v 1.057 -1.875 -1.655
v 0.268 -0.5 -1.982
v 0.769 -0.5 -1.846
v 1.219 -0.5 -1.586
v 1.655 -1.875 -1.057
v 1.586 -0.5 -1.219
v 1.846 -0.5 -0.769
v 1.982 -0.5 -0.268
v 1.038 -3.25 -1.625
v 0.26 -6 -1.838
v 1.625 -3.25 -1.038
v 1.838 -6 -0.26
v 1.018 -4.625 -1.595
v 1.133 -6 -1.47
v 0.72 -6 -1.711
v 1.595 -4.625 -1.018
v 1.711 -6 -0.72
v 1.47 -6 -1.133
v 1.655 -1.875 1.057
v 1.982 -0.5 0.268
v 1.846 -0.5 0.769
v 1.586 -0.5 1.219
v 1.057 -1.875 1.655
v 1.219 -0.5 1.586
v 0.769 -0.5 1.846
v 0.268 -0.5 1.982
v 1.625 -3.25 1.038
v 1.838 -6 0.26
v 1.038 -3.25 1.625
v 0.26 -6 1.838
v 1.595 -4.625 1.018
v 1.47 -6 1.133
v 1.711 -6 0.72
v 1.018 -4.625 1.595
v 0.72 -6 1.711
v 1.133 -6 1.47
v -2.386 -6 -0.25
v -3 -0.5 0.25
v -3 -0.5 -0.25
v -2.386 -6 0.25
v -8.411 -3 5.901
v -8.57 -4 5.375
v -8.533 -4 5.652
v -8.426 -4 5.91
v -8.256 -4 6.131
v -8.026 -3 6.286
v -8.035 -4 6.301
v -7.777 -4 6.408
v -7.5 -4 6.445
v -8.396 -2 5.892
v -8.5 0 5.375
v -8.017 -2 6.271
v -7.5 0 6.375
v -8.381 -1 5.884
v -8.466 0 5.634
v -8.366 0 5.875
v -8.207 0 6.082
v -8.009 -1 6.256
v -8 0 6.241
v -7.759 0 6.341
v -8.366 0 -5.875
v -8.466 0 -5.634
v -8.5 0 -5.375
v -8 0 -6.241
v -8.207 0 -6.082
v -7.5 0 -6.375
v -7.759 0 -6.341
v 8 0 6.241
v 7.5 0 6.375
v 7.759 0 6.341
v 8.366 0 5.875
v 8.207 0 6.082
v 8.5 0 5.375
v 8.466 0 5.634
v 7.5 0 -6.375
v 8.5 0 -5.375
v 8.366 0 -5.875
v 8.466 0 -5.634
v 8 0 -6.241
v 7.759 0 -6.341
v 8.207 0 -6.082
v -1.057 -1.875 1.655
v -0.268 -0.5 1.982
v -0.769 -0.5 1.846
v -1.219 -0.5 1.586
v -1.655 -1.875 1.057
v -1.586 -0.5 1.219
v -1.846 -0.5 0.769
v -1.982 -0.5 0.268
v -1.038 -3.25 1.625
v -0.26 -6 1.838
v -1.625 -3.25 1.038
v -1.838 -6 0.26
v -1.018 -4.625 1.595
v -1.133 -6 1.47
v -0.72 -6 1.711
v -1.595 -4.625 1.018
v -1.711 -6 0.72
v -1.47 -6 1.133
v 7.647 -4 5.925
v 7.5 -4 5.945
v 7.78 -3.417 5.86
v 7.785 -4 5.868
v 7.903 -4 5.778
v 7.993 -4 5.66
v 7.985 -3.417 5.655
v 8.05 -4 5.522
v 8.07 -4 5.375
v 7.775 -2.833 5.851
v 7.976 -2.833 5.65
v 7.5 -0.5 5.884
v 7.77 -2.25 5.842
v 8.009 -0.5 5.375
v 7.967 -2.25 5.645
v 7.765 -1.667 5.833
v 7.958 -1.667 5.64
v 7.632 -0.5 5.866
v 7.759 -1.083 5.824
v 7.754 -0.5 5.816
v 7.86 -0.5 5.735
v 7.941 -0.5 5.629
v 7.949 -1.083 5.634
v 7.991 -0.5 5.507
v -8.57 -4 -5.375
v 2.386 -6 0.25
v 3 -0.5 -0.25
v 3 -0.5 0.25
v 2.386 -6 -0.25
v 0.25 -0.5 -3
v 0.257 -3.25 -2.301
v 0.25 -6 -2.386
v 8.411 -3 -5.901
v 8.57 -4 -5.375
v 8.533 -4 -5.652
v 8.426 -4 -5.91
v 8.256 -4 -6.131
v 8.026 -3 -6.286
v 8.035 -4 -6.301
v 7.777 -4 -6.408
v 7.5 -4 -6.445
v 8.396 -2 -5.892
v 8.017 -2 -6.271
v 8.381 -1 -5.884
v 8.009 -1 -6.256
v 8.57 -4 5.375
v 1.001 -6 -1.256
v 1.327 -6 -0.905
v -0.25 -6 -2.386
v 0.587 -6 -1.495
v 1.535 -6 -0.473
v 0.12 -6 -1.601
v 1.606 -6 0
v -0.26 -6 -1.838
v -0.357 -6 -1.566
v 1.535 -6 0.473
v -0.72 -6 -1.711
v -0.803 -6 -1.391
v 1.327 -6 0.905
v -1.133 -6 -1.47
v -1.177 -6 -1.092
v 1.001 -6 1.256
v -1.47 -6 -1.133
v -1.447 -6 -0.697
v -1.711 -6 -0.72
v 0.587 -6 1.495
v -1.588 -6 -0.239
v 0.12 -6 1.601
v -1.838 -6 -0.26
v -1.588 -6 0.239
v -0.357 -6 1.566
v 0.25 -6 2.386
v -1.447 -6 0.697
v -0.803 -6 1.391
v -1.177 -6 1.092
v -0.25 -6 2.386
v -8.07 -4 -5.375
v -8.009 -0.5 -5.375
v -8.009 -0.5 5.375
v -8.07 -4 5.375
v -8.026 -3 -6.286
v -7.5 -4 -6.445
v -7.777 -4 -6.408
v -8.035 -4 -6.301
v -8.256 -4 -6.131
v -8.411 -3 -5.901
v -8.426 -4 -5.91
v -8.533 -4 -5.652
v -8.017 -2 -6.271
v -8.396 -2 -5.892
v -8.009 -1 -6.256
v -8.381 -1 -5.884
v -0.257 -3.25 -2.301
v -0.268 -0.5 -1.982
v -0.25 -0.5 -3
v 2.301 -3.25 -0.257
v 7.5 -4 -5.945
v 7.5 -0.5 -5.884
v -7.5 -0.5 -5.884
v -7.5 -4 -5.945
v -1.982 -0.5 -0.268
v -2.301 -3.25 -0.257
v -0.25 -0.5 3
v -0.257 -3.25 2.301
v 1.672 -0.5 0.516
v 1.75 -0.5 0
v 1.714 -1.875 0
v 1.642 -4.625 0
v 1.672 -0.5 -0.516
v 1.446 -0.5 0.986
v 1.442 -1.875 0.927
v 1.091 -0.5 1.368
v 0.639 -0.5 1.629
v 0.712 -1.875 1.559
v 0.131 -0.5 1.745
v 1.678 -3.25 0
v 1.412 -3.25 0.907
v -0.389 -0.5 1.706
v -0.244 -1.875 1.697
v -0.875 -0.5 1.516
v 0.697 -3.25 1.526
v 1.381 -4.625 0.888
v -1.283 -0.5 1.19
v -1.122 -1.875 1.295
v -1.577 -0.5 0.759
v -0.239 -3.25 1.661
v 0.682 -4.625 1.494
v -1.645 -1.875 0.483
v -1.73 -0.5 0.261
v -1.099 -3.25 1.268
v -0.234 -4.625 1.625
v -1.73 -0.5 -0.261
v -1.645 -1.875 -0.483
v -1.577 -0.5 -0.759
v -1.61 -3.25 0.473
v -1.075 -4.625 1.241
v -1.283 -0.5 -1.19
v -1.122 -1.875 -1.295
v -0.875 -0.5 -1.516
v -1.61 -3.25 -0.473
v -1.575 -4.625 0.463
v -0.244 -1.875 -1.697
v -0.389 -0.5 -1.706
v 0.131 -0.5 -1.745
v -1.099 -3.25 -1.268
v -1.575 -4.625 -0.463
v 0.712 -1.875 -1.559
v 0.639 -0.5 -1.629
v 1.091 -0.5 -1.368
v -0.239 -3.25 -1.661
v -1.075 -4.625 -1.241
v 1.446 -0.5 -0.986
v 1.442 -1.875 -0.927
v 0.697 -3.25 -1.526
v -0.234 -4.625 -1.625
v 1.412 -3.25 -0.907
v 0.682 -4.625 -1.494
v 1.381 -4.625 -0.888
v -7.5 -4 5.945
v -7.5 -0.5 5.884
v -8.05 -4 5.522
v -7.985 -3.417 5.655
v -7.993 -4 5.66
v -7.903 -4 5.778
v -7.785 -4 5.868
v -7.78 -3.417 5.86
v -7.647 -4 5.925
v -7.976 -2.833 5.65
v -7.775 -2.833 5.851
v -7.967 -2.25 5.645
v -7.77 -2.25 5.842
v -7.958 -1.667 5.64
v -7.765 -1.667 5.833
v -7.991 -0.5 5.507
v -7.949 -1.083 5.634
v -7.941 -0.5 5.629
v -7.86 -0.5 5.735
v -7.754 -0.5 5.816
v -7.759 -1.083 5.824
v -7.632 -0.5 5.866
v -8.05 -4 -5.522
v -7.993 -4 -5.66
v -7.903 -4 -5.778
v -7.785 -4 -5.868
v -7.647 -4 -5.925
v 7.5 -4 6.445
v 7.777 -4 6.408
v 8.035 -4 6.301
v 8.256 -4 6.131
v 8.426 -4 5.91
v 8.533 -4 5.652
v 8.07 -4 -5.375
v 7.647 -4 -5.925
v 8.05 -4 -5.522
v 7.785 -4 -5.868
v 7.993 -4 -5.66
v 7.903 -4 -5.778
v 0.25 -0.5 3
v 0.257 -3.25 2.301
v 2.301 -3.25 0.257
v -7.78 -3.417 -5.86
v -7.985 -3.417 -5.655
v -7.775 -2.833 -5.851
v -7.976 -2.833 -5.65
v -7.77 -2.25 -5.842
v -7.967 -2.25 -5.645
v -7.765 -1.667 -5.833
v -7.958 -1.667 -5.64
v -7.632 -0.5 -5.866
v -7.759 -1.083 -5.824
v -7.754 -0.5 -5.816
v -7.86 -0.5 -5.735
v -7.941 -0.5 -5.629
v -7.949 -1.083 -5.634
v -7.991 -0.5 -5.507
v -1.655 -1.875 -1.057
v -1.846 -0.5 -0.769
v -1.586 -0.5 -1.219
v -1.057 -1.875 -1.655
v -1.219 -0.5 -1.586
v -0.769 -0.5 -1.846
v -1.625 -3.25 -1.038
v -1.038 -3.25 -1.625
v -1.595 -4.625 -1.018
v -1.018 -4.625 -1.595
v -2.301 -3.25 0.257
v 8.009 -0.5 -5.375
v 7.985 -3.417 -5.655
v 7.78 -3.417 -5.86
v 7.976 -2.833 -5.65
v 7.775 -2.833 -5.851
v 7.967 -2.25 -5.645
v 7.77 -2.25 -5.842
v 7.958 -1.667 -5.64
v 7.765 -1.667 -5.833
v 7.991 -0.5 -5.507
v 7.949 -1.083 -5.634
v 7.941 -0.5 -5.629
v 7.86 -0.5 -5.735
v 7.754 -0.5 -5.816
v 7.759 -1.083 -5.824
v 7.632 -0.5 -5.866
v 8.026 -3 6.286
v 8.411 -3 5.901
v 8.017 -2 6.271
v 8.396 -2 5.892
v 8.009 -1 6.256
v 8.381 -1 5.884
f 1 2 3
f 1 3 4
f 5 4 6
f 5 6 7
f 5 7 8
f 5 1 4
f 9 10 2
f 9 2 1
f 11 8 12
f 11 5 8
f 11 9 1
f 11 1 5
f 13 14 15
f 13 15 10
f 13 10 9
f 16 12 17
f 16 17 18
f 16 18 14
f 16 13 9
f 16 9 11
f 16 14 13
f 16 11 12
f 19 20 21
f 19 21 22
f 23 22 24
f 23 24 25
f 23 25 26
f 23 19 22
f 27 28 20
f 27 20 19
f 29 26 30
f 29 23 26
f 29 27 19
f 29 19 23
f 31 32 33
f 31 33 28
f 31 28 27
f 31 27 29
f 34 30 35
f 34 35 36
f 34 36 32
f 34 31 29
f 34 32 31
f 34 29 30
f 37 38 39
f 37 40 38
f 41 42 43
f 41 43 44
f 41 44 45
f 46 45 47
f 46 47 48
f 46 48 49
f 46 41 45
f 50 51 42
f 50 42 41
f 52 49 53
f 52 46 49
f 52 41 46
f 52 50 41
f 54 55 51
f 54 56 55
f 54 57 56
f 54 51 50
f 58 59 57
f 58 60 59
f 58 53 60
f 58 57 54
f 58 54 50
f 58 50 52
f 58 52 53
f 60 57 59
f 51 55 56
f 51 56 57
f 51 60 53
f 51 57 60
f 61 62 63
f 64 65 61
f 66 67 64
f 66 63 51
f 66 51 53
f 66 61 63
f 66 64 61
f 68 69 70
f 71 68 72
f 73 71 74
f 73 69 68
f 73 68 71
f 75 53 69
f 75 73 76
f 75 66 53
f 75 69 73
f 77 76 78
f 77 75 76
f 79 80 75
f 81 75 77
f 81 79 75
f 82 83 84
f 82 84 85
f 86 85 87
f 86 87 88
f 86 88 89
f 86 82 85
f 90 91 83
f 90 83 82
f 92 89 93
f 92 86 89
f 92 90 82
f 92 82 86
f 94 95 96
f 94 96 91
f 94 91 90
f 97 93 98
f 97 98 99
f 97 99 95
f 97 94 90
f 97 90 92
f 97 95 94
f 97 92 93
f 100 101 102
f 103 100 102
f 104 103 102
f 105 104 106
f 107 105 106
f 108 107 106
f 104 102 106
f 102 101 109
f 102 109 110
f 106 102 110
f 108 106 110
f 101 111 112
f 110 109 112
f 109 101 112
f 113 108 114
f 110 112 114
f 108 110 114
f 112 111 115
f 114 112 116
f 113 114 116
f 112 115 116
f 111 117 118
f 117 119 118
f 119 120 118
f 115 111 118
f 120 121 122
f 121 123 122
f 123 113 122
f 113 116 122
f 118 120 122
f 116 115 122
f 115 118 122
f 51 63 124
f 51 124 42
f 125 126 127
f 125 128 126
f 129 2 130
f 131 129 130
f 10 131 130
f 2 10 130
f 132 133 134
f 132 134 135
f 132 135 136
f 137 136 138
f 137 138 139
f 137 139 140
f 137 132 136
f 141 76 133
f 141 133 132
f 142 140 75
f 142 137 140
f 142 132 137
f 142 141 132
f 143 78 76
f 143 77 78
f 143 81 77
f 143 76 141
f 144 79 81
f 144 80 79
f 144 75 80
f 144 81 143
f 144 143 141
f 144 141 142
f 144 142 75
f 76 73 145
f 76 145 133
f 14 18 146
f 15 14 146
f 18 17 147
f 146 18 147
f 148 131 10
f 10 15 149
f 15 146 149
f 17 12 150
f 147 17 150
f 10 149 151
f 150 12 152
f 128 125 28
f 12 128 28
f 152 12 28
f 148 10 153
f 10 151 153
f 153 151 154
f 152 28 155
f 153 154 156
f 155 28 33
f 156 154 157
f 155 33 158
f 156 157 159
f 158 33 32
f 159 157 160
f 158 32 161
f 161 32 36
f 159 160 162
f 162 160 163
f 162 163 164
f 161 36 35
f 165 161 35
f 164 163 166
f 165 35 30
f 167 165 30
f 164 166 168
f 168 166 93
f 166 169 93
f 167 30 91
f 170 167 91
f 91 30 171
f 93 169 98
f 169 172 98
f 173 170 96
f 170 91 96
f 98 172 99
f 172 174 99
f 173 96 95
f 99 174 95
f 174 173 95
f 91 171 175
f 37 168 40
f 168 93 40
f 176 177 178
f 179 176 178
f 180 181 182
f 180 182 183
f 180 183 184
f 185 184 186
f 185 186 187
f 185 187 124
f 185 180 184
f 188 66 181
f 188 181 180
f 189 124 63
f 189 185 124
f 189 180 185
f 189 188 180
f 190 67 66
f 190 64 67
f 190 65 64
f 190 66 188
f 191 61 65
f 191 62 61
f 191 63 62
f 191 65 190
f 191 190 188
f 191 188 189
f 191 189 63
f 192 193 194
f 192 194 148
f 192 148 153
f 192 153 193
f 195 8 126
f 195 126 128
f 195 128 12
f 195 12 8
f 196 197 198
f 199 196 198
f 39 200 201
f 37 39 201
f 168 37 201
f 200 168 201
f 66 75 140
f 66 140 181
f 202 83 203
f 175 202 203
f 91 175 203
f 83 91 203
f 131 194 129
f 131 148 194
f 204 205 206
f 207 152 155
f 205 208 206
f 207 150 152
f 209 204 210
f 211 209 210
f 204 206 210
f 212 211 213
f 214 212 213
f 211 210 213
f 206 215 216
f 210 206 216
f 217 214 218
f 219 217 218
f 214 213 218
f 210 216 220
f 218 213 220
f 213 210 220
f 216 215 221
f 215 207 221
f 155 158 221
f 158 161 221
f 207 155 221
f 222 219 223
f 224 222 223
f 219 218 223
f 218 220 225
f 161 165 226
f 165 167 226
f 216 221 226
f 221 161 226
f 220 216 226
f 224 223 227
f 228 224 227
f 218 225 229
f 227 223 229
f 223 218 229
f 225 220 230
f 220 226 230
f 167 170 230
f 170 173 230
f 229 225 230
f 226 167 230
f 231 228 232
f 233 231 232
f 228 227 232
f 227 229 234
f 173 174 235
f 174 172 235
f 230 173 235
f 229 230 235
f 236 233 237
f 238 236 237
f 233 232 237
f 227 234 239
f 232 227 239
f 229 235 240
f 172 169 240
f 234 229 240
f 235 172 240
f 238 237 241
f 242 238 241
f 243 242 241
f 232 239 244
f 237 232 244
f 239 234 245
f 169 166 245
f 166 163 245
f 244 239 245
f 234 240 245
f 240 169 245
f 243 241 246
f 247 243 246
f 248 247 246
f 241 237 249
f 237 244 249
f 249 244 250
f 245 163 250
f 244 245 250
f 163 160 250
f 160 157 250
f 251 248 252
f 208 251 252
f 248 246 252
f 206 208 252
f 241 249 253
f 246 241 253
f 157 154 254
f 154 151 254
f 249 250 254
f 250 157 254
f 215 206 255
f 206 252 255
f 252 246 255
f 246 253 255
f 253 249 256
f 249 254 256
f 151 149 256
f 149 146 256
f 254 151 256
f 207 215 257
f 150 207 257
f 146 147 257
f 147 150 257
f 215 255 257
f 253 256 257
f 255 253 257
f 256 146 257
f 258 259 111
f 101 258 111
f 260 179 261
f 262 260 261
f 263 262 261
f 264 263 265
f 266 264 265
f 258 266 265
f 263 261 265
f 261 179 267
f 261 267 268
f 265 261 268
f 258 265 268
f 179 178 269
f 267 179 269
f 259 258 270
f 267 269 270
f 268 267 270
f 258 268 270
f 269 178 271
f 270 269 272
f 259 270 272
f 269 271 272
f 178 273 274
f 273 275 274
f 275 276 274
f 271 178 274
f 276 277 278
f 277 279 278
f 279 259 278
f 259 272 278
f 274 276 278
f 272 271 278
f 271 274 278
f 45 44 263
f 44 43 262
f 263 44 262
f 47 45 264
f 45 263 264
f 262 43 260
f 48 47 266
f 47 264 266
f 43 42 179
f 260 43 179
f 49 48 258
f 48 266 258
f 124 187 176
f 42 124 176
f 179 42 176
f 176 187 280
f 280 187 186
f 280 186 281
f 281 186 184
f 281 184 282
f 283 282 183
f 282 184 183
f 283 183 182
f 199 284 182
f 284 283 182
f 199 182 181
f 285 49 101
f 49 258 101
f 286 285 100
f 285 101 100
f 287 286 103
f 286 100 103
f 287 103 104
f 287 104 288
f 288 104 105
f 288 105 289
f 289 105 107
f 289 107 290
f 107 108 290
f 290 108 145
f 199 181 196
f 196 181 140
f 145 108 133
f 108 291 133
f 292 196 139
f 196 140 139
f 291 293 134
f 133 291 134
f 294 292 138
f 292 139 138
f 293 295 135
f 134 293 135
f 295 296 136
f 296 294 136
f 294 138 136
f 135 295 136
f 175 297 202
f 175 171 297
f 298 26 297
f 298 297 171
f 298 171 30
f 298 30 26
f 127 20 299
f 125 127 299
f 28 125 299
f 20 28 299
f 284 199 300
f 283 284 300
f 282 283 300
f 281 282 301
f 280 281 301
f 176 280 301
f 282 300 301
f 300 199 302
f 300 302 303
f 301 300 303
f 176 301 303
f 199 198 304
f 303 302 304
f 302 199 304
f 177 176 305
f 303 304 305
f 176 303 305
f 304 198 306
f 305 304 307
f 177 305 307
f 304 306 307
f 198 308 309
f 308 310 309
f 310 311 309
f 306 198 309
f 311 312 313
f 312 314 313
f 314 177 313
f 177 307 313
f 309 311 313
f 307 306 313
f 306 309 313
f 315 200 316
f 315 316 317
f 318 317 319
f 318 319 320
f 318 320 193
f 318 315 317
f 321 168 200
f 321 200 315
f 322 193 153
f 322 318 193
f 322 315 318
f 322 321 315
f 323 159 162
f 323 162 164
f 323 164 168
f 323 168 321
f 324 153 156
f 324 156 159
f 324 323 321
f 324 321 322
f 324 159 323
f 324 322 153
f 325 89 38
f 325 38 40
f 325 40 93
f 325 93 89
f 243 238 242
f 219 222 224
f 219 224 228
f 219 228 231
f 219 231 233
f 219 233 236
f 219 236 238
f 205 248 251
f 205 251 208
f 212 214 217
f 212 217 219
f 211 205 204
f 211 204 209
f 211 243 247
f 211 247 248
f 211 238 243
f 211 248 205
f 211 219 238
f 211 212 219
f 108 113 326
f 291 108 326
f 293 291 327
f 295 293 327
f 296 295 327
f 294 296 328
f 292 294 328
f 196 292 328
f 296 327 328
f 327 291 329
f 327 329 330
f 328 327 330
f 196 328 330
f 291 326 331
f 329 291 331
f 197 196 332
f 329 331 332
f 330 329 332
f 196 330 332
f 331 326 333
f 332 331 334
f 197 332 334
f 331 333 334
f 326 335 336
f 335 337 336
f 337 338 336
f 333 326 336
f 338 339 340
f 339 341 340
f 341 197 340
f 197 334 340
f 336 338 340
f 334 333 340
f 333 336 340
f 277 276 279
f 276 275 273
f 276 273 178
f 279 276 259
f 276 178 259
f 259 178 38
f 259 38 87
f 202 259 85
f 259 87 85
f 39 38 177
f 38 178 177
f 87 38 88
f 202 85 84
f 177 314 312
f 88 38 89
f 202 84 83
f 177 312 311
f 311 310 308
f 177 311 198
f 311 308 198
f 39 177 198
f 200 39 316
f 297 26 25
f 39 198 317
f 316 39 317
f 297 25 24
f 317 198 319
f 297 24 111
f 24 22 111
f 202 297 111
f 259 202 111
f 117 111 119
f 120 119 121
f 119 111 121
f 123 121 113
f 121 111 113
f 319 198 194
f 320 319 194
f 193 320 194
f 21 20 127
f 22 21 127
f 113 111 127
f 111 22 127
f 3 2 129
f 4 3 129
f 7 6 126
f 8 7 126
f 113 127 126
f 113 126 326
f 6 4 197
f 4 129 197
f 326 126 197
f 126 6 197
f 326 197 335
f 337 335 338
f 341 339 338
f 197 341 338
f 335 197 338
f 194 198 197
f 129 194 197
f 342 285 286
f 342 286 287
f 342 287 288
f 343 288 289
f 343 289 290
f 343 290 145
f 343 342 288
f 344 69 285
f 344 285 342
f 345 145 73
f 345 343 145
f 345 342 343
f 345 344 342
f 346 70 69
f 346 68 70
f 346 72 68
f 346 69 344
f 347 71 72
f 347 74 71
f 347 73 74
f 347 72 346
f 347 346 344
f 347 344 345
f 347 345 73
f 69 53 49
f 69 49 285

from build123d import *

# Parameters (mm, degrees)
BOSS_EXTRUDE1_DEPTH = 4
BOSS_EXTRUDE1_DRAFT = 1
SHELL1_T            = -0.5
SKETCH2_R           = 2
BOSS_EXTRUDE2_DEPTH = 5.5
BOSS_EXTRUDE2_TAPER = 1.5
CIRPATTERN1_COUNT   = 4
SKETCH4_R           = 1.605977431
CUT_EXTRUDE1_DEPTH  = 5.5
CUT_EXTRUDE1_DRAFT  = 1.5


with BuildPart() as part:
    # Sketch1 → Boss-Extrude1 (with draft: the straight prism first)
    with BuildSketch(Plane(origin=(0, 0, 0), x_dir=(1, 0, 0), z_dir=(0, 1, 0))):
        with BuildLine():
            Line((-7.5, -6.375), (7.5, -6.375))
            ThreePointArc((7.5, -6.375), (8.207106781, -6.082106781), (8.5, -5.375))
            Line((8.5, -5.375), (8.5, 5.375))
            ThreePointArc((8.5, 5.375), (8.207106781, 6.082106781), (7.5, 6.375))
            Line((7.5, 6.375), (-7.5, 6.375))
            ThreePointArc((-7.5, 6.375), (-8.207106781, 6.082106781), (-8.5, 5.375))
            Line((-8.5, 5.375), (-8.5, -5.375))
            ThreePointArc((-8.5, -5.375), (-8.207106781, -6.082106781), (-7.5, -6.375))
        make_face()
    extrude(amount=-BOSS_EXTRUDE1_DEPTH)
    # Boss-Extrude1: the draft: its side faces are tilted about the plane it starts from
    boss_extrude1_sides = [part.faces().sort_by_distance(p)[0] for p in [
        (0, -2, 6.375),
        (8.207106781, -2, 6.082106781),
        (8.5, -2, 0),
        (8.207106781, -2, -6.082106781),
        (0, -2, -6.375),
        (-8.207106781, -2, -6.082106781),
        (-8.5, -2, 0),
        (-8.207106781, -2, 6.082106781),
    ]]
    draft(boss_extrude1_sides, Plane(origin=(0, 0, 0), x_dir=(1, 0, 0), z_dir=(0, 1, 0)), BOSS_EXTRUDE1_DRAFT)

    # Shell1
    shell1_openings = [part.faces().sort_by_distance(p)[0] for p in [
        (0, -4, 0),
    ]]
    offset(amount=SHELL1_T, openings=shell1_openings, kind=Kind.INTERSECTION)

    # Sketch2 → Boss-Extrude2 (add)
    with BuildSketch(Plane.XZ.offset(0.5)):
        Circle(SKETCH2_R)
    extrude(amount=BOSS_EXTRUDE2_DEPTH, taper=BOSS_EXTRUDE2_TAPER)

    # Rib1: read off the stored shape, not the designer's step
    # Rib1: loft between two sections, ruled curve by curve
    rib1_from = [
        Edge.make_line((1.98200868, -0.5, 0.267659472), (3, -0.5, 0.25)),
        Edge.make_line((1.98200868, -0.5, -0.267659472), (3, -0.5, -0.25)),
        Edge.make_line((3, -0.5, -0.25), (3, -0.5, 0.25)),
        Edge.make_line((1.98200868, -0.5, -0.267659472), (1.98200868, -0.5, 0.267659472)),
    ]
    rib1_to = [
        Edge.make_line((1.837744445, -6, 0.259514127), (2.386192277, -6, 0.25)),
        Edge.make_line((1.837744445, -6, -0.259514127), (2.386192277, -6, -0.25)),
        Edge.make_line((2.386192277, -6, -0.25), (2.386192277, -6, 0.25)),
        Edge.make_line((1.837744445, -6, -0.259514127), (1.837744445, -6, 0.259514127)),
    ]
    rib1 = Solid(Shell([*[Face.make_surface_from_curves(rib1_from[k], rib1_to[k]) for k in range(4)], Face(Wire(rib1_from)), Face(Wire(rib1_to))]))
    add(rib1)

    # CirPattern1: Rib1 ×4 about axis
    cirpattern1_axis = Axis((0, 0, 0), (0, 1, 0))
    for i in range(1, CIRPATTERN1_COUNT):
        add(rib1.rotate(cirpattern1_axis, i * 360 / CIRPATTERN1_COUNT))


with BuildPart() as cut_extrude1_tool:
    # Sketch4 → Cut-Extrude1 (with draft: the straight prism first)
    with BuildSketch(Plane.XZ.offset(6)):
        Circle(SKETCH4_R)
    extrude(amount=-CUT_EXTRUDE1_DEPTH)
    # Cut-Extrude1: the draft: its side faces are tilted about the plane it starts from
    cut_extrude1_sides = [cut_extrude1_tool.faces().sort_by_distance(p)[0] for p in [
        (-1.605977431, -3.25, 0),
    ]]
    draft(cut_extrude1_sides, Plane.XZ.offset(6), CUT_EXTRUDE1_DRAFT)


with BuildPart() as part_1:
    add(part.part)

    # Cut-Extrude1: cut by cut_extrude1_tool
    add(cut_extrude1_tool.part, mode=Mode.SUBTRACT)


solid = part_1.part
